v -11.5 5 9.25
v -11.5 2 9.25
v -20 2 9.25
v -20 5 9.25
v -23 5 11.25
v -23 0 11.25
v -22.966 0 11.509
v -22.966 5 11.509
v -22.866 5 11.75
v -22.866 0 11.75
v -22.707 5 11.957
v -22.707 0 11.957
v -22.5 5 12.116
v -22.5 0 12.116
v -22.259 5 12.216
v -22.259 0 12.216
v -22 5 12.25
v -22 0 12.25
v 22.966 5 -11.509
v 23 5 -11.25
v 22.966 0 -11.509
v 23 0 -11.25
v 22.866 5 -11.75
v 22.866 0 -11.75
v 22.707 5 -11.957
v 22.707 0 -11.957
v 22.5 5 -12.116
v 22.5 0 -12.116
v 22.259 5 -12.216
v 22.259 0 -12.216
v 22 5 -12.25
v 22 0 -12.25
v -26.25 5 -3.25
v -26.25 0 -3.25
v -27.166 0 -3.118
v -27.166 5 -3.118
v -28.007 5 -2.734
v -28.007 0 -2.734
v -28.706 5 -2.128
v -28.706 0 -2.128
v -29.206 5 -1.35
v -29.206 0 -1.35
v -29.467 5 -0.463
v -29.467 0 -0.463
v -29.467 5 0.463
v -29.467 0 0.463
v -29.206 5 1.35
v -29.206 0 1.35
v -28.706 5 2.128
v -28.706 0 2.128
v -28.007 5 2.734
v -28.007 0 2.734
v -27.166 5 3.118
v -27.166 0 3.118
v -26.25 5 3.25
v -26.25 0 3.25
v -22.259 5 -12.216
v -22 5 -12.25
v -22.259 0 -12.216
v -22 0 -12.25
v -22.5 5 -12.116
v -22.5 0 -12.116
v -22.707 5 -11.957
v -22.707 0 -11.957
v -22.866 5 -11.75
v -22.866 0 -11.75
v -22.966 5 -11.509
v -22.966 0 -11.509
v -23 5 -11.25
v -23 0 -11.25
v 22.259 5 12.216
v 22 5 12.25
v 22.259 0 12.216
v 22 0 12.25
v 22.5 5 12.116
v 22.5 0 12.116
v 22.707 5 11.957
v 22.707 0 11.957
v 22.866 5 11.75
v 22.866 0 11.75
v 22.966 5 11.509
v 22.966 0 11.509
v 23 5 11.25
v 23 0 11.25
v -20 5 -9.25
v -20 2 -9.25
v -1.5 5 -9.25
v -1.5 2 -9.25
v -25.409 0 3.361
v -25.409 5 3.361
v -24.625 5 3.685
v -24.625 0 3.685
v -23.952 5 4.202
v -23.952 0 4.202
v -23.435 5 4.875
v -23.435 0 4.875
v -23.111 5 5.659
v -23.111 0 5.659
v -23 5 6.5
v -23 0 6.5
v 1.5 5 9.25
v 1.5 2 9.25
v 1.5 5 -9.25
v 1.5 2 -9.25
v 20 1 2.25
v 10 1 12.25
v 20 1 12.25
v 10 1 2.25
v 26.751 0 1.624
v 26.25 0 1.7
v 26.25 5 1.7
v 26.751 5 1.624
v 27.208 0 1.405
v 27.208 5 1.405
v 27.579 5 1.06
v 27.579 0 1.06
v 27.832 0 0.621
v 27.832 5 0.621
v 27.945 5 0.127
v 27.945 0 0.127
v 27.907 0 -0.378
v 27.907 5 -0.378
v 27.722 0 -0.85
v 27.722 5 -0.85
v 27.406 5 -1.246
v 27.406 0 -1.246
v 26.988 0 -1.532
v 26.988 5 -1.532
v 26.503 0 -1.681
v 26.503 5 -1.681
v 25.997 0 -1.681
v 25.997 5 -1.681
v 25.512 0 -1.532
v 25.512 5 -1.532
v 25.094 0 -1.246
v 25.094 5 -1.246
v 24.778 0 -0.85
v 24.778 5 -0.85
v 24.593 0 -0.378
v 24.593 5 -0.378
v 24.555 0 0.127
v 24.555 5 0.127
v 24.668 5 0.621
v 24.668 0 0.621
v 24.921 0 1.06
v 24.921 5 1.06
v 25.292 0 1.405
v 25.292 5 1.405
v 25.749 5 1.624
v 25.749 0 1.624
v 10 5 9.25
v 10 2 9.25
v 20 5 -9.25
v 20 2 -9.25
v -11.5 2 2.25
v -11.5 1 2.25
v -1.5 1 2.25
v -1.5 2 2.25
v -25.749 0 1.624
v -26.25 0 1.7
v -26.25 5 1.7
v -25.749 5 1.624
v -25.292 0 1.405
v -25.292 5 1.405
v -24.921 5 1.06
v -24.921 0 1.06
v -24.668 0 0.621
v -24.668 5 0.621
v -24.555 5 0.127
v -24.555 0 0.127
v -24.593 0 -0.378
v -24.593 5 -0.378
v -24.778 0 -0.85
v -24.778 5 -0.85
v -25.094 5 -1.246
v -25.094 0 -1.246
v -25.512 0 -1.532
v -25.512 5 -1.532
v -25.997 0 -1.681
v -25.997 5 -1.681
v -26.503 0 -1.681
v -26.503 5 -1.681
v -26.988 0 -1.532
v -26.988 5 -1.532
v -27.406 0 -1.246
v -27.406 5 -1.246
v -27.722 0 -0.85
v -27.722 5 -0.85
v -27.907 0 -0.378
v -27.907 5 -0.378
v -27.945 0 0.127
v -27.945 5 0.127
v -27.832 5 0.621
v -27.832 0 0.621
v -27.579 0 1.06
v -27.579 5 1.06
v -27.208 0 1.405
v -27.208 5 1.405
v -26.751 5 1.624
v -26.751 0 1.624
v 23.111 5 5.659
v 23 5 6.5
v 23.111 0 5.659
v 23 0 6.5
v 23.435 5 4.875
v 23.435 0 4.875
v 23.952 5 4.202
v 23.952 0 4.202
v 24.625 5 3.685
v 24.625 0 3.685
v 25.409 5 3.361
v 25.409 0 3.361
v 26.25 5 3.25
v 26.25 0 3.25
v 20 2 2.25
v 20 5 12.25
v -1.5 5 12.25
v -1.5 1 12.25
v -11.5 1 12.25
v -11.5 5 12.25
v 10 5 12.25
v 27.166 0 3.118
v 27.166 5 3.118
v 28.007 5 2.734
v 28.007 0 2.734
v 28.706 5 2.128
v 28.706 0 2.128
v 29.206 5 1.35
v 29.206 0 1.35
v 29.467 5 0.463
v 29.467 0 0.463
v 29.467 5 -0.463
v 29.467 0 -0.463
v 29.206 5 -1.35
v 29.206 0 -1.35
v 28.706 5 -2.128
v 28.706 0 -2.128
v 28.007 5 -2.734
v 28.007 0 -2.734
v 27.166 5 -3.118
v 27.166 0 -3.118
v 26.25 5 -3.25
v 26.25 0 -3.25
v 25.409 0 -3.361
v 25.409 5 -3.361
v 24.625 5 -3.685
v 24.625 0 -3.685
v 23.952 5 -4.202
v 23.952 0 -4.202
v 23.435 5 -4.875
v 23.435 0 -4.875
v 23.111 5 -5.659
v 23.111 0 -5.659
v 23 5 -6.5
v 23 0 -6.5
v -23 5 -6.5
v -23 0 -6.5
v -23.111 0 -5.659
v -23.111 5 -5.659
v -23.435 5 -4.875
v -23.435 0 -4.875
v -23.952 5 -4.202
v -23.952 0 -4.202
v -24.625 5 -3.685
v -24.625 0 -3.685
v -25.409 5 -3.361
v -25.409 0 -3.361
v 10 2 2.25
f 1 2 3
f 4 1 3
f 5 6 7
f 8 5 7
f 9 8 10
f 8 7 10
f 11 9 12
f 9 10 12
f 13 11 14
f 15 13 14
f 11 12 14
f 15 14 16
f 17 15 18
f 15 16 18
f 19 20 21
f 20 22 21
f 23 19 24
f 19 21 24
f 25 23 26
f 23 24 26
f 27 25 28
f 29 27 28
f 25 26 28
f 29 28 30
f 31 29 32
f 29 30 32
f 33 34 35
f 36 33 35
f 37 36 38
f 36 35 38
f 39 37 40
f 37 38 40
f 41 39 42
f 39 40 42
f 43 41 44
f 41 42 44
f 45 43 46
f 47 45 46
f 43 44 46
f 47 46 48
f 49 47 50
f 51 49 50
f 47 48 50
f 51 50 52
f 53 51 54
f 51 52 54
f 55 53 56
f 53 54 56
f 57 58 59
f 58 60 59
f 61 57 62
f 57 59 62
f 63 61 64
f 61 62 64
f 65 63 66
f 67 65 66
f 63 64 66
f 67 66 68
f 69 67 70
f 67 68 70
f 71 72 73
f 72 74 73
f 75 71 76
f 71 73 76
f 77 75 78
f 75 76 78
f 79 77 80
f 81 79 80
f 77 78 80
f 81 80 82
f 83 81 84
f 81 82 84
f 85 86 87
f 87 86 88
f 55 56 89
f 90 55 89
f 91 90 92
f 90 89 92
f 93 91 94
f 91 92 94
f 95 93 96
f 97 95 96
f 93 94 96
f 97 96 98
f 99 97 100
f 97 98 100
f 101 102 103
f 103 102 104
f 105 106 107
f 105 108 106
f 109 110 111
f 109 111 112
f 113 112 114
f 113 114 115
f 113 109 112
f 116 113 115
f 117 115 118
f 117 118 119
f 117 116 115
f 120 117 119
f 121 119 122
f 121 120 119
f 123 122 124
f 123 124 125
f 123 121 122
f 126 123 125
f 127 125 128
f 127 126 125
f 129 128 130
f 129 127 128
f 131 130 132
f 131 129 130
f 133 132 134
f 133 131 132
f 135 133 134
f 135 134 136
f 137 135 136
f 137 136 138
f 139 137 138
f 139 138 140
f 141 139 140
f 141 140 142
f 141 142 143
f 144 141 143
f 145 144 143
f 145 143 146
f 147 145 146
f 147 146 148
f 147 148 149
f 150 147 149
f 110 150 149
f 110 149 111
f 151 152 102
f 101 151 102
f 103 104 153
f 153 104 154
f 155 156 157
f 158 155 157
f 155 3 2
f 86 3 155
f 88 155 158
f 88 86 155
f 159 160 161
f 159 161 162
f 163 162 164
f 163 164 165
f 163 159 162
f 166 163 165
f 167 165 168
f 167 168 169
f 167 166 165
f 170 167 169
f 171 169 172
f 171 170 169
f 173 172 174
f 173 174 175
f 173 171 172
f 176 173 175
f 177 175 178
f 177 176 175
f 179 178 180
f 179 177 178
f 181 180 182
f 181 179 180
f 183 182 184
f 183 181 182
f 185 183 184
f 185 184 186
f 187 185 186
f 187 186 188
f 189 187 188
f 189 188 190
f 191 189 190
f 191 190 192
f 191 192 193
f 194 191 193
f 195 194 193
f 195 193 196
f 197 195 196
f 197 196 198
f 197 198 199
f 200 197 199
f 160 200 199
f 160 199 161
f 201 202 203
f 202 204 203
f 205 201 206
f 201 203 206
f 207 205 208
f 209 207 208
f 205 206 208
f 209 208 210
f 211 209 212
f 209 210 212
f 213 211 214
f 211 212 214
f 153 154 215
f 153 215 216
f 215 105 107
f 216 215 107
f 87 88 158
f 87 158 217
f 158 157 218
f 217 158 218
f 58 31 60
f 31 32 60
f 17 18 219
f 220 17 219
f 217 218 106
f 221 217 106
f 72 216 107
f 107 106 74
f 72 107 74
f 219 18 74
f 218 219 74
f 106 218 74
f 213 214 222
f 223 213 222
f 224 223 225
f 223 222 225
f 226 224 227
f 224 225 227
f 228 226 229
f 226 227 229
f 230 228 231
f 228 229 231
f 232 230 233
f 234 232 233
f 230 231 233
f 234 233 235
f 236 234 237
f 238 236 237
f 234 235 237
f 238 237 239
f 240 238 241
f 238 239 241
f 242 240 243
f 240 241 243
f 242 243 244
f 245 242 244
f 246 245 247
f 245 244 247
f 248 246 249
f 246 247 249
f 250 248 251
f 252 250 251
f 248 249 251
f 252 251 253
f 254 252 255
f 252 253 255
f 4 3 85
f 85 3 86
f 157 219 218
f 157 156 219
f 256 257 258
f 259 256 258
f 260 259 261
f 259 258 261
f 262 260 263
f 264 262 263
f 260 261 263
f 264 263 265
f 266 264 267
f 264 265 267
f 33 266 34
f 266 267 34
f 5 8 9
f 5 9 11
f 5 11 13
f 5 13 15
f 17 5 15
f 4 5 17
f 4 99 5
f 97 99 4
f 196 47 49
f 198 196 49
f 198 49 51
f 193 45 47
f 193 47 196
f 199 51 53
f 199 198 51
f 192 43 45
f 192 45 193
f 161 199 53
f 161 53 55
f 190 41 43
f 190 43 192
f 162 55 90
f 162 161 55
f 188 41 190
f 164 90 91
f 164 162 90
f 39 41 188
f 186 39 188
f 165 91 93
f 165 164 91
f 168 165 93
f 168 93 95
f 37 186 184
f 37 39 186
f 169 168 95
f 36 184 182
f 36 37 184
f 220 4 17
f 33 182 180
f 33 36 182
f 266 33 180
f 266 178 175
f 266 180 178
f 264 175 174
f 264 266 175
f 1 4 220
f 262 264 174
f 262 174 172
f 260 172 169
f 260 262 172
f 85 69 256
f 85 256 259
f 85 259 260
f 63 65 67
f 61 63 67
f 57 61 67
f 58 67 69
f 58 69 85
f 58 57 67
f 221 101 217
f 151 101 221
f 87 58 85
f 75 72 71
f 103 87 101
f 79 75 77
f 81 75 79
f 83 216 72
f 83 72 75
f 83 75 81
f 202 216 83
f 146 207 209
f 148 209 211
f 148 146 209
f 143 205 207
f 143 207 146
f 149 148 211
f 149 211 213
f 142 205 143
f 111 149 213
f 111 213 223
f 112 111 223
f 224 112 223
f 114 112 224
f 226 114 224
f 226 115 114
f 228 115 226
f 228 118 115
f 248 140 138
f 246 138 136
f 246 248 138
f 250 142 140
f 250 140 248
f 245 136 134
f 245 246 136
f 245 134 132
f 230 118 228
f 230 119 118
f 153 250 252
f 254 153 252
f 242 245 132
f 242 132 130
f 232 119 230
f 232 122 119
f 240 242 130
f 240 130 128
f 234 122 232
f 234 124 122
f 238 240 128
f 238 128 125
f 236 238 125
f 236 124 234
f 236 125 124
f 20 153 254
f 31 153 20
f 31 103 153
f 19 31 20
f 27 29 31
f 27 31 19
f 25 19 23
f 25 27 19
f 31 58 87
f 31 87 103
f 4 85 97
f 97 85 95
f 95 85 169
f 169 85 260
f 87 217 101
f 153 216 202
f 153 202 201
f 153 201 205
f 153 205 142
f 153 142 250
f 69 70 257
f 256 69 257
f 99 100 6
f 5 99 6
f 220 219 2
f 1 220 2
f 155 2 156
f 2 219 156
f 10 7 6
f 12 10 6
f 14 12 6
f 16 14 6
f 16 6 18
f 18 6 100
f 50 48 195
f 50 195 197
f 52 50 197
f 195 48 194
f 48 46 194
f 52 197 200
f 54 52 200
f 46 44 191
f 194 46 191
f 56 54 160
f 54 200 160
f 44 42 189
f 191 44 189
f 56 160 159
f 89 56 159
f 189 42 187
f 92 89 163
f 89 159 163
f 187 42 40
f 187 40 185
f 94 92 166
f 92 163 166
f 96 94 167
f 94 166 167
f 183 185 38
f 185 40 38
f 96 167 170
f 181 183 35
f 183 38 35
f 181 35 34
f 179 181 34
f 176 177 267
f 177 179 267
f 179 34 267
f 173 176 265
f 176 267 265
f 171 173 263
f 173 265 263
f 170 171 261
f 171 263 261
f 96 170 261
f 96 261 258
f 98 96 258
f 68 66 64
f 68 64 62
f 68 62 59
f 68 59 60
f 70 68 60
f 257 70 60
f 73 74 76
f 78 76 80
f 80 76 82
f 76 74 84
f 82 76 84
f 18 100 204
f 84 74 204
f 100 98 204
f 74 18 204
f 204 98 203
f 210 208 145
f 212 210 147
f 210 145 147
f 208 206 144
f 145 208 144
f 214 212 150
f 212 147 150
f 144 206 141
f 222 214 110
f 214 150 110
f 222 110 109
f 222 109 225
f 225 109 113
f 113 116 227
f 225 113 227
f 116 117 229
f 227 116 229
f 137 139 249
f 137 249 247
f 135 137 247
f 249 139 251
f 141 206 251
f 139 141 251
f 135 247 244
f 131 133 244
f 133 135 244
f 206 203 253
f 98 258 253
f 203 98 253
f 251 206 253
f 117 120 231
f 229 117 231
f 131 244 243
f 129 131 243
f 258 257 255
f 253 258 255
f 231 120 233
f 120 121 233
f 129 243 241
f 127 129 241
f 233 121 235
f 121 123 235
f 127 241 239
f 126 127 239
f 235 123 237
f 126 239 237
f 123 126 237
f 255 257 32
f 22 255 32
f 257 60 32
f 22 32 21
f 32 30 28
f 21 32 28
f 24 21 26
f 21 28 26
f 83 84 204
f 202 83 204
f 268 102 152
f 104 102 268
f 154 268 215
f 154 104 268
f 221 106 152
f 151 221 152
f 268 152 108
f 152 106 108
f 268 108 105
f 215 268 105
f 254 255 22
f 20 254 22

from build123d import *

# Parameters (mm, degrees)
SKETCH_1_R      = 1.7
SKETCH_1_W      = 10
SKETCH_1_H      = 3
SKETCH_1_H_2    = 7
EXTRUDE_1_DEPTH = 1
EXTRUDE_START   = 1
SKETCH_1_3_R    = 1.7
EXTRUDE_2_DEPTH = 1
EXTRUDE_START_2 = 2
SKETCH_1_5_R    = 1.7
EXTRUDE_3_DEPTH = 3
EXTRUDE_START_3 = 7
SKETCH_1_7_R    = 1.7
SKETCH_1_7_W    = 10
SKETCH_1_7_H    = 3
EXTRUDE_4_DEPTH = 2.5
EXTRUDE_START_4 = 9.5
SKETCH_1_9_W    = 10
SKETCH_1_9_H    = 7
SKETCH_1_9_H_2  = 3
SKETCH_1_9_R    = 1.7
EXTRUDE_5_DEPTH = 1
FILLET_1_R      = 1


with BuildPart() as part:
    # Эскиз1 → Бобышка-Вытянуть1 (new body)
    # profile 1 of 9: a face of its own
    with BuildSketch(Plane(origin=(0, 0, 0), x_dir=(1, 0, 0), z_dir=(0, 1, 0))):
        with BuildLine():
            ThreePointArc((-26.25, -3.25), (-23.951902961, -4.201902961), (-23, -6.5))
            Line((-23, -6.5), (-23, 6.5))
            ThreePointArc((-23, 6.5), (-23.951902961, 4.201902961), (-26.25, 3.25))
            ThreePointArc((-26.25, 3.25), (-29.5, 0), (-26.25, -3.25))
        make_face()
        with Locations(Location((-26.25, 0, 0), (0, 0, 270))):
            Circle(SKETCH_1_R, mode=Mode.SUBTRACT)
    # profile 2 of 9: a face of its own
    with BuildSketch(Plane(origin=(0, 0, 0), x_dir=(1, 0, 0), z_dir=(0, 1, 0))):
        with BuildLine():
            Line((20, -12.25), (22, -12.25))
            ThreePointArc((22, -12.25), (22.707106781, -11.957106781), (23, -11.25))
            Line((23, -11.25), (23, -6.5))
            Line((23, -6.5), (23, 6.5))
            Line((23, 6.5), (23, 11.25))
            ThreePointArc((23, 11.25), (22.707106781, 11.957106781), (22, 12.25))
            Line((22, 12.25), (-22, 12.25))
            ThreePointArc((-22, 12.25), (-22.707106781, 11.957106781), (-23, 11.25))
            Line((-23, 11.25), (-23, 6.5))
            Line((-23, 6.5), (-23, -6.5))
            Line((-23, -6.5), (-23, -11.25))
            ThreePointArc((-23, -11.25), (-22.707106781, -11.957106781), (-22, -12.25))
            Line((-22, -12.25), (-11.5, -12.25))
            Line((-11.5, -12.25), (-11.5, -9.25))
            Line((-11.5, -9.25), (-20, -9.25))
            Line((-20, -9.25), (-20, 9.25))
            Line((-20, 9.25), (-1.5, 9.25))
            Line((-1.5, 9.25), (-1.5, -2.25))
            Line((-1.5, -2.25), (-1.5, -9.25))
            Line((-1.5, -9.25), (-1.5, -12.25))
            Line((-1.5, -12.25), (10, -12.25))
            Line((10, -12.25), (10, -9.25))
            Line((10, -9.25), (1.5, -9.25))
            Line((1.5, -9.25), (1.5, 9.25))
            Line((1.5, 9.25), (20, 9.25))
            Line((20, 9.25), (20, -2.25))
            Line((20, -2.25), (20, -9.25))
            Line((20, -9.25), (20, -12.25))
        make_face()
    # profile 3 of 9: a face of its own
    with BuildSketch(Plane(origin=(0, 0, 0), x_dir=(1, 0, 0), z_dir=(0, 1, 0))):
        with Locations((-6.5, -10.75)):
            Rectangle(SKETCH_1_W, SKETCH_1_H)
    # profile 4 of 9: a face of its own
    with BuildSketch(Plane(origin=(0, 0, 0), x_dir=(1, 0, 0), z_dir=(0, 1, 0))):
        with Locations((-6.5, -5.75)):
            Rectangle(SKETCH_1_W, SKETCH_1_H_2)
    # profile 5 of 9: a face of its own
    with BuildSketch(Plane(origin=(0, 0, 0), x_dir=(1, 0, 0), z_dir=(0, 1, 0))):
        Polygon((-20, -9.25), (-11.5, -9.25), (-11.5, -2.25), (-1.5, -2.25), (-1.5, 9.25), (-20, 9.25), align=None)
    # profile 6 of 9: a face of its own
    with BuildSketch(Plane(origin=(0, 0, 0), x_dir=(1, 0, 0), z_dir=(0, 1, 0))):
        Polygon((1.5, -9.25), (10, -9.25), (10, -2.25), (20, -2.25), (20, 9.25), (1.5, 9.25), align=None)
    # profile 7 of 9: a face of its own
    with BuildSketch(Plane(origin=(0, 0, 0), x_dir=(1, 0, 0), z_dir=(0, 1, 0))):
        with Locations((15, -10.75)):
            Rectangle(SKETCH_1_W, SKETCH_1_H)
    # profile 8 of 9: a face of its own
    with BuildSketch(Plane(origin=(0, 0, 0), x_dir=(1, 0, 0), z_dir=(0, 1, 0))):
        with Locations((15, -5.75)):
            Rectangle(SKETCH_1_W, SKETCH_1_H_2)
    # profile 9 of 9: a face of its own
    with BuildSketch(Plane(origin=(0, 0, 0), x_dir=(1, 0, 0), z_dir=(0, 1, 0))):
        with BuildLine():
            Line((23, 6.5), (23, -6.5))
            ThreePointArc((23, -6.5), (23.951902961, -4.201902961), (26.25, -3.25))
            ThreePointArc((26.25, -3.25), (29.5, 0), (26.25, 3.25))
            ThreePointArc((26.25, 3.25), (23.951902961, 4.201902961), (23, 6.5))
        make_face()
        with Locations(Location((26.25, 0, 0), (0, 0, 270))):
            Circle(SKETCH_1_R, mode=Mode.SUBTRACT)
    extrude(amount=EXTRUDE_1_DEPTH)

    # Эскиз1<3> → Бобышка-Вытянуть2 (add)
    # profile 1 of 5: a face of its own
    with BuildSketch(Plane(origin=(0, 0, 0), x_dir=(1, 0, 0), z_dir=(0, 1, 0)).offset(EXTRUDE_START)):
        with BuildLine():
            Line((20, -12.25), (22, -12.25))
            ThreePointArc((22, -12.25), (22.707106781, -11.957106781), (23, -11.25))
            Line((23, -11.25), (23, -6.5))
            Line((23, -6.5), (23, 6.5))
            Line((23, 6.5), (23, 11.25))
            ThreePointArc((23, 11.25), (22.707106781, 11.957106781), (22, 12.25))
            Line((22, 12.25), (-22, 12.25))
            ThreePointArc((-22, 12.25), (-22.707106781, 11.957106781), (-23, 11.25))
            Line((-23, 11.25), (-23, 6.5))
            Line((-23, 6.5), (-23, -6.5))
            Line((-23, -6.5), (-23, -11.25))
            ThreePointArc((-23, -11.25), (-22.707106781, -11.957106781), (-22, -12.25))
            Line((-22, -12.25), (-11.5, -12.25))
            Line((-11.5, -12.25), (-11.5, -9.25))
            Line((-11.5, -9.25), (-20, -9.25))
            Line((-20, -9.25), (-20, 9.25))
            Line((-20, 9.25), (-1.5, 9.25))
            Line((-1.5, 9.25), (-1.5, -2.25))
            Line((-1.5, -2.25), (-1.5, -9.25))
            Line((-1.5, -9.25), (-1.5, -12.25))
            Line((-1.5, -12.25), (10, -12.25))
            Line((10, -12.25), (10, -9.25))
            Line((10, -9.25), (1.5, -9.25))
            Line((1.5, -9.25), (1.5, 9.25))
            Line((1.5, 9.25), (20, 9.25))
            Line((20, 9.25), (20, -2.25))
            Line((20, -2.25), (20, -9.25))
            Line((20, -9.25), (20, -12.25))
        make_face()
    # profile 2 of 5: a face of its own
    with BuildSketch(Plane(origin=(0, 0, 0), x_dir=(1, 0, 0), z_dir=(0, 1, 0)).offset(EXTRUDE_START)):
        Polygon((-20, -9.25), (-11.5, -9.25), (-11.5, -2.25), (-1.5, -2.25), (-1.5, 9.25), (-20, 9.25), align=None)
    # profile 3 of 5: a face of its own
    with BuildSketch(Plane(origin=(0, 0, 0), x_dir=(1, 0, 0), z_dir=(0, 1, 0)).offset(EXTRUDE_START)):
        with BuildLine():
            ThreePointArc((-26.25, -3.25), (-23.951902961, -4.201902961), (-23, -6.5))
            Line((-23, -6.5), (-23, 6.5))
            ThreePointArc((-23, 6.5), (-23.951902961, 4.201902961), (-26.25, 3.25))
            ThreePointArc((-26.25, 3.25), (-29.5, 0), (-26.25, -3.25))
        make_face()
        with Locations(Location((-26.25, 0, 0), (0, 0, 270))):
            Circle(SKETCH_1_3_R, mode=Mode.SUBTRACT)
    # profile 4 of 5: a face of its own
    with BuildSketch(Plane(origin=(0, 0, 0), x_dir=(1, 0, 0), z_dir=(0, 1, 0)).offset(EXTRUDE_START)):
        Polygon((1.5, -9.25), (10, -9.25), (10, -2.25), (20, -2.25), (20, 9.25), (1.5, 9.25), align=None)
    # profile 5 of 5: a face of its own
    with BuildSketch(Plane(origin=(0, 0, 0), x_dir=(1, 0, 0), z_dir=(0, 1, 0)).offset(EXTRUDE_START)):
        with BuildLine():
            Line((23, 6.5), (23, -6.5))
            ThreePointArc((23, -6.5), (23.951902961, -4.201902961), (26.25, -3.25))
            ThreePointArc((26.25, -3.25), (29.5, 0), (26.25, 3.25))
            ThreePointArc((26.25, 3.25), (23.951902961, 4.201902961), (23, 6.5))
        make_face()
        with Locations(Location((26.25, 0, 0), (0, 0, 270))):
            Circle(SKETCH_1_3_R, mode=Mode.SUBTRACT)
    extrude(amount=EXTRUDE_2_DEPTH)

    # Эскиз1<5> → Бобышка-Вытянуть3 (add)
    # profile 1 of 3: a face of its own
    with BuildSketch(Plane(origin=(0, 0, 0), x_dir=(1, 0, 0), z_dir=(0, 1, 0)).offset(EXTRUDE_START_2)):
        with BuildLine():
            Line((20, -12.25), (22, -12.25))
            ThreePointArc((22, -12.25), (22.707106781, -11.957106781), (23, -11.25))
            Line((23, -11.25), (23, -6.5))
            Line((23, -6.5), (23, 6.5))
            Line((23, 6.5), (23, 11.25))
            ThreePointArc((23, 11.25), (22.707106781, 11.957106781), (22, 12.25))
            Line((22, 12.25), (-22, 12.25))
            ThreePointArc((-22, 12.25), (-22.707106781, 11.957106781), (-23, 11.25))
            Line((-23, 11.25), (-23, 6.5))
            Line((-23, 6.5), (-23, -6.5))
            Line((-23, -6.5), (-23, -11.25))
            ThreePointArc((-23, -11.25), (-22.707106781, -11.957106781), (-22, -12.25))
            Line((-22, -12.25), (-11.5, -12.25))
            Line((-11.5, -12.25), (-11.5, -9.25))
            Line((-11.5, -9.25), (-20, -9.25))
            Line((-20, -9.25), (-20, 9.25))
            Line((-20, 9.25), (-1.5, 9.25))
            Line((-1.5, 9.25), (-1.5, -2.25))
            Line((-1.5, -2.25), (-1.5, -9.25))
            Line((-1.5, -9.25), (-1.5, -12.25))
            Line((-1.5, -12.25), (10, -12.25))
            Line((10, -12.25), (10, -9.25))
            Line((10, -9.25), (1.5, -9.25))
            Line((1.5, -9.25), (1.5, 9.25))
            Line((1.5, 9.25), (20, 9.25))
            Line((20, 9.25), (20, -2.25))
            Line((20, -2.25), (20, -9.25))
            Line((20, -9.25), (20, -12.25))
        make_face()
    # profile 2 of 3: a face of its own
    with BuildSketch(Plane(origin=(0, 0, 0), x_dir=(1, 0, 0), z_dir=(0, 1, 0)).offset(EXTRUDE_START_2)):
        with BuildLine():
            ThreePointArc((-26.25, -3.25), (-23.951902961, -4.201902961), (-23, -6.5))
            Line((-23, -6.5), (-23, 6.5))
            ThreePointArc((-23, 6.5), (-23.951902961, 4.201902961), (-26.25, 3.25))
            ThreePointArc((-26.25, 3.25), (-29.5, 0), (-26.25, -3.25))
        make_face()
        with Locations(Location((-26.25, 0, 0), (0, 0, 270))):
            Circle(SKETCH_1_5_R, mode=Mode.SUBTRACT)
    # profile 3 of 3: a face of its own
    with BuildSketch(Plane(origin=(0, 0, 0), x_dir=(1, 0, 0), z_dir=(0, 1, 0)).offset(EXTRUDE_START_2)):
        with BuildLine():
            Line((23, 6.5), (23, -6.5))
            ThreePointArc((23, -6.5), (23.951902961, -4.201902961), (26.25, -3.25))
            ThreePointArc((26.25, -3.25), (29.5, 0), (26.25, 3.25))
            ThreePointArc((26.25, 3.25), (23.951902961, 4.201902961), (23, 6.5))
        make_face()
        with Locations(Location((26.25, 0, 0), (0, 0, 270))):
            Circle(SKETCH_1_5_R, mode=Mode.SUBTRACT)
    extrude(amount=EXTRUDE_3_DEPTH)


with BuildPart() as body_2:
    # Эскиз1<7> → Бобышка-Вытянуть4 (new body)
    # profile 1 of 5: a face of its own
    with BuildSketch(Plane(origin=(0, 0, 0), x_dir=(1, 0, 0), z_dir=(0, 1, 0)).offset(EXTRUDE_START_3)):
        with BuildLine():
            Line((20, -12.25), (22, -12.25))
            ThreePointArc((22, -12.25), (22.707106781, -11.957106781), (23, -11.25))
            Line((23, -11.25), (23, -6.5))
            Line((23, -6.5), (23, 6.5))
            Line((23, 6.5), (23, 11.25))
            ThreePointArc((23, 11.25), (22.707106781, 11.957106781), (22, 12.25))
            Line((22, 12.25), (-22, 12.25))
            ThreePointArc((-22, 12.25), (-22.707106781, 11.957106781), (-23, 11.25))
            Line((-23, 11.25), (-23, 6.5))
            Line((-23, 6.5), (-23, -6.5))
            Line((-23, -6.5), (-23, -11.25))
            ThreePointArc((-23, -11.25), (-22.707106781, -11.957106781), (-22, -12.25))
            Line((-22, -12.25), (-11.5, -12.25))
            Line((-11.5, -12.25), (-11.5, -9.25))
            Line((-11.5, -9.25), (-20, -9.25))
            Line((-20, -9.25), (-20, 9.25))
            Line((-20, 9.25), (-1.5, 9.25))
            Line((-1.5, 9.25), (-1.5, -2.25))
            Line((-1.5, -2.25), (-1.5, -9.25))
            Line((-1.5, -9.25), (-1.5, -12.25))
            Line((-1.5, -12.25), (10, -12.25))
            Line((10, -12.25), (10, -9.25))
            Line((10, -9.25), (1.5, -9.25))
            Line((1.5, -9.25), (1.5, 9.25))
            Line((1.5, 9.25), (20, 9.25))
            Line((20, 9.25), (20, -2.25))
            Line((20, -2.25), (20, -9.25))
            Line((20, -9.25), (20, -12.25))
        make_face()
    # profile 2 of 5: a face of its own
    with BuildSketch(Plane(origin=(0, 0, 0), x_dir=(1, 0, 0), z_dir=(0, 1, 0)).offset(EXTRUDE_START_3)):
        with BuildLine():
            ThreePointArc((-26.25, -3.25), (-23.951902961, -4.201902961), (-23, -6.5))
            Line((-23, -6.5), (-23, 6.5))
            ThreePointArc((-23, 6.5), (-23.951902961, 4.201902961), (-26.25, 3.25))
            ThreePointArc((-26.25, 3.25), (-29.5, 0), (-26.25, -3.25))
        make_face()
        with Locations(Location((-26.25, 0, 0), (0, 0, 270))):
            Circle(SKETCH_1_7_R, mode=Mode.SUBTRACT)
    # profile 3 of 5: a face of its own
    with BuildSketch(Plane(origin=(0, 0, 0), x_dir=(1, 0, 0), z_dir=(0, 1, 0)).offset(EXTRUDE_START_3)):
        with BuildLine():
            Line((23, 6.5), (23, -6.5))
            ThreePointArc((23, -6.5), (23.951902961, -4.201902961), (26.25, -3.25))
            ThreePointArc((26.25, -3.25), (29.5, 0), (26.25, 3.25))
            ThreePointArc((26.25, 3.25), (23.951902961, 4.201902961), (23, 6.5))
        make_face()
        with Locations(Location((26.25, 0, 0), (0, 0, 270))):
            Circle(SKETCH_1_7_R, mode=Mode.SUBTRACT)
    # profile 4 of 5: a face of its own
    with BuildSketch(Plane(origin=(0, 0, 0), x_dir=(1, 0, 0), z_dir=(0, 1, 0)).offset(EXTRUDE_START_3)):
        with Locations((-6.5, -10.75)):
            Rectangle(SKETCH_1_7_W, SKETCH_1_7_H)
    # profile 5 of 5: a face of its own
    with BuildSketch(Plane(origin=(0, 0, 0), x_dir=(1, 0, 0), z_dir=(0, 1, 0)).offset(EXTRUDE_START_3)):
        with Locations((15, -10.75)):
            Rectangle(SKETCH_1_7_W, SKETCH_1_7_H)
    extrude(amount=EXTRUDE_4_DEPTH)

    # Эскиз1<9> → Бобышка-Вытянуть5 (add)
    # profile 1 of 9: a face of its own
    with BuildSketch(Plane(origin=(0, 0, 0), x_dir=(1, 0, 0), z_dir=(0, 1, 0)).offset(EXTRUDE_START_4)):
        Polygon((-20, -9.25), (-11.5, -9.25), (-11.5, -2.25), (-1.5, -2.25), (-1.5, 9.25), (-20, 9.25), align=None)
    # profile 2 of 9: a face of its own
    with BuildSketch(Plane(origin=(0, 0, 0), x_dir=(1, 0, 0), z_dir=(0, 1, 0)).offset(EXTRUDE_START_4)):
        Polygon((1.5, -9.25), (10, -9.25), (10, -2.25), (20, -2.25), (20, 9.25), (1.5, 9.25), align=None)
    # profile 3 of 9: a face of its own
    with BuildSketch(Plane(origin=(0, 0, 0), x_dir=(1, 0, 0), z_dir=(0, 1, 0)).offset(EXTRUDE_START_4)):
        with Locations((15, -5.75)):
            Rectangle(SKETCH_1_9_W, SKETCH_1_9_H)
    # profile 4 of 9: a face of its own
    with BuildSketch(Plane(origin=(0, 0, 0), x_dir=(1, 0, 0), z_dir=(0, 1, 0)).offset(EXTRUDE_START_4)):
        with Locations((15, -10.75)):
            Rectangle(SKETCH_1_9_W, SKETCH_1_9_H_2)
    # profile 5 of 9: a face of its own
    with BuildSketch(Plane(origin=(0, 0, 0), x_dir=(1, 0, 0), z_dir=(0, 1, 0)).offset(EXTRUDE_START_4)):
        with Locations((-6.5, -10.75)):
            Rectangle(SKETCH_1_9_W, SKETCH_1_9_H_2)
    # profile 6 of 9: a face of its own
    with BuildSketch(Plane(origin=(0, 0, 0), x_dir=(1, 0, 0), z_dir=(0, 1, 0)).offset(EXTRUDE_START_4)):
        with Locations((-6.5, -5.75)):
            Rectangle(SKETCH_1_9_W, SKETCH_1_9_H)
    # profile 7 of 9: a face of its own
    with BuildSketch(Plane(origin=(0, 0, 0), x_dir=(1, 0, 0), z_dir=(0, 1, 0)).offset(EXTRUDE_START_4)):
        with BuildLine():
            Line((20, -12.25), (22, -12.25))
            ThreePointArc((22, -12.25), (22.707106781, -11.957106781), (23, -11.25))
            Line((23, -11.25), (23, -6.5))
            Line((23, -6.5), (23, 6.5))
            Line((23, 6.5), (23, 11.25))
            ThreePointArc((23, 11.25), (22.707106781, 11.957106781), (22, 12.25))
            Line((22, 12.25), (-22, 12.25))
            ThreePointArc((-22, 12.25), (-22.707106781, 11.957106781), (-23, 11.25))
            Line((-23, 11.25), (-23, 6.5))
            Line((-23, 6.5), (-23, -6.5))
            Line((-23, -6.5), (-23, -11.25))
            ThreePointArc((-23, -11.25), (-22.707106781, -11.957106781), (-22, -12.25))
            Line((-22, -12.25), (-11.5, -12.25))
            Line((-11.5, -12.25), (-11.5, -9.25))
            Line((-11.5, -9.25), (-20, -9.25))
            Line((-20, -9.25), (-20, 9.25))
            Line((-20, 9.25), (-1.5, 9.25))
            Line((-1.5, 9.25), (-1.5, -2.25))
            Line((-1.5, -2.25), (-1.5, -9.25))
            Line((-1.5, -9.25), (-1.5, -12.25))
            Line((-1.5, -12.25), (10, -12.25))
            Line((10, -12.25), (10, -9.25))
            Line((10, -9.25), (1.5, -9.25))
            Line((1.5, -9.25), (1.5, 9.25))
            Line((1.5, 9.25), (20, 9.25))
            Line((20, 9.25), (20, -2.25))
            Line((20, -2.25), (20, -9.25))
            Line((20, -9.25), (20, -12.25))
        make_face()
    # profile 8 of 9: a face of its own
    with BuildSketch(Plane(origin=(0, 0, 0), x_dir=(1, 0, 0), z_dir=(0, 1, 0)).offset(EXTRUDE_START_4)):
        with BuildLine():
            Line((23, 6.5), (23, -6.5))
            ThreePointArc((23, -6.5), (23.951902961, -4.201902961), (26.25, -3.25))
            ThreePointArc((26.25, -3.25), (29.5, 0), (26.25, 3.25))
            ThreePointArc((26.25, 3.25), (23.951902961, 4.201902961), (23, 6.5))
        make_face()
        with Locations(Location((26.25, 0, 0), (0, 0, 270))):
            Circle(SKETCH_1_9_R, mode=Mode.SUBTRACT)
    # profile 9 of 9: a face of its own
    with BuildSketch(Plane(origin=(0, 0, 0), x_dir=(1, 0, 0), z_dir=(0, 1, 0)).offset(EXTRUDE_START_4)):
        with BuildLine():
            ThreePointArc((-26.25, -3.25), (-23.951902961, -4.201902961), (-23, -6.5))
            Line((-23, -6.5), (-23, 6.5))
            ThreePointArc((-23, 6.5), (-23.951902961, 4.201902961), (-26.25, 3.25))
            ThreePointArc((-26.25, 3.25), (-29.5, 0), (-26.25, -3.25))
        make_face()
        with Locations(Location((-26.25, 0, 0), (0, 0, 270))):
            Circle(SKETCH_1_9_R, mode=Mode.SUBTRACT)
    extrude(amount=EXTRUDE_5_DEPTH)

    # Скругление1
    fillet_1_edges = [body_2.edges().sort_by_distance(p)[0] for p in [
        (-22.707106781, 10.5, -11.957106781),
        (-23, 10.5, -8.875),
        (-29.5, 10.5, 0),
        (-23, 10.5, 8.875),
        (-22.707106781, 10.5, 11.957106781),
        (0, 10.5, 12.25),
        (22.707106781, 10.5, 11.957106781),
        (29.5, 10.5, 0),
        (22.707106781, 10.5, -11.957106781),
        (0, 10.5, -12.25),
        (-23.951902961, 10.5, -4.201902961),
        (-23.951902961, 10.5, 4.201902961),
        (23, 10.5, 8.875),
        (23.951902961, 10.5, 4.201902961),
        (23.951902961, 10.5, -4.201902961),
        (23, 10.5, -8.875),
    ]]
    fillet(fillet_1_edges, radius=FILLET_1_R)


solid = part.part
